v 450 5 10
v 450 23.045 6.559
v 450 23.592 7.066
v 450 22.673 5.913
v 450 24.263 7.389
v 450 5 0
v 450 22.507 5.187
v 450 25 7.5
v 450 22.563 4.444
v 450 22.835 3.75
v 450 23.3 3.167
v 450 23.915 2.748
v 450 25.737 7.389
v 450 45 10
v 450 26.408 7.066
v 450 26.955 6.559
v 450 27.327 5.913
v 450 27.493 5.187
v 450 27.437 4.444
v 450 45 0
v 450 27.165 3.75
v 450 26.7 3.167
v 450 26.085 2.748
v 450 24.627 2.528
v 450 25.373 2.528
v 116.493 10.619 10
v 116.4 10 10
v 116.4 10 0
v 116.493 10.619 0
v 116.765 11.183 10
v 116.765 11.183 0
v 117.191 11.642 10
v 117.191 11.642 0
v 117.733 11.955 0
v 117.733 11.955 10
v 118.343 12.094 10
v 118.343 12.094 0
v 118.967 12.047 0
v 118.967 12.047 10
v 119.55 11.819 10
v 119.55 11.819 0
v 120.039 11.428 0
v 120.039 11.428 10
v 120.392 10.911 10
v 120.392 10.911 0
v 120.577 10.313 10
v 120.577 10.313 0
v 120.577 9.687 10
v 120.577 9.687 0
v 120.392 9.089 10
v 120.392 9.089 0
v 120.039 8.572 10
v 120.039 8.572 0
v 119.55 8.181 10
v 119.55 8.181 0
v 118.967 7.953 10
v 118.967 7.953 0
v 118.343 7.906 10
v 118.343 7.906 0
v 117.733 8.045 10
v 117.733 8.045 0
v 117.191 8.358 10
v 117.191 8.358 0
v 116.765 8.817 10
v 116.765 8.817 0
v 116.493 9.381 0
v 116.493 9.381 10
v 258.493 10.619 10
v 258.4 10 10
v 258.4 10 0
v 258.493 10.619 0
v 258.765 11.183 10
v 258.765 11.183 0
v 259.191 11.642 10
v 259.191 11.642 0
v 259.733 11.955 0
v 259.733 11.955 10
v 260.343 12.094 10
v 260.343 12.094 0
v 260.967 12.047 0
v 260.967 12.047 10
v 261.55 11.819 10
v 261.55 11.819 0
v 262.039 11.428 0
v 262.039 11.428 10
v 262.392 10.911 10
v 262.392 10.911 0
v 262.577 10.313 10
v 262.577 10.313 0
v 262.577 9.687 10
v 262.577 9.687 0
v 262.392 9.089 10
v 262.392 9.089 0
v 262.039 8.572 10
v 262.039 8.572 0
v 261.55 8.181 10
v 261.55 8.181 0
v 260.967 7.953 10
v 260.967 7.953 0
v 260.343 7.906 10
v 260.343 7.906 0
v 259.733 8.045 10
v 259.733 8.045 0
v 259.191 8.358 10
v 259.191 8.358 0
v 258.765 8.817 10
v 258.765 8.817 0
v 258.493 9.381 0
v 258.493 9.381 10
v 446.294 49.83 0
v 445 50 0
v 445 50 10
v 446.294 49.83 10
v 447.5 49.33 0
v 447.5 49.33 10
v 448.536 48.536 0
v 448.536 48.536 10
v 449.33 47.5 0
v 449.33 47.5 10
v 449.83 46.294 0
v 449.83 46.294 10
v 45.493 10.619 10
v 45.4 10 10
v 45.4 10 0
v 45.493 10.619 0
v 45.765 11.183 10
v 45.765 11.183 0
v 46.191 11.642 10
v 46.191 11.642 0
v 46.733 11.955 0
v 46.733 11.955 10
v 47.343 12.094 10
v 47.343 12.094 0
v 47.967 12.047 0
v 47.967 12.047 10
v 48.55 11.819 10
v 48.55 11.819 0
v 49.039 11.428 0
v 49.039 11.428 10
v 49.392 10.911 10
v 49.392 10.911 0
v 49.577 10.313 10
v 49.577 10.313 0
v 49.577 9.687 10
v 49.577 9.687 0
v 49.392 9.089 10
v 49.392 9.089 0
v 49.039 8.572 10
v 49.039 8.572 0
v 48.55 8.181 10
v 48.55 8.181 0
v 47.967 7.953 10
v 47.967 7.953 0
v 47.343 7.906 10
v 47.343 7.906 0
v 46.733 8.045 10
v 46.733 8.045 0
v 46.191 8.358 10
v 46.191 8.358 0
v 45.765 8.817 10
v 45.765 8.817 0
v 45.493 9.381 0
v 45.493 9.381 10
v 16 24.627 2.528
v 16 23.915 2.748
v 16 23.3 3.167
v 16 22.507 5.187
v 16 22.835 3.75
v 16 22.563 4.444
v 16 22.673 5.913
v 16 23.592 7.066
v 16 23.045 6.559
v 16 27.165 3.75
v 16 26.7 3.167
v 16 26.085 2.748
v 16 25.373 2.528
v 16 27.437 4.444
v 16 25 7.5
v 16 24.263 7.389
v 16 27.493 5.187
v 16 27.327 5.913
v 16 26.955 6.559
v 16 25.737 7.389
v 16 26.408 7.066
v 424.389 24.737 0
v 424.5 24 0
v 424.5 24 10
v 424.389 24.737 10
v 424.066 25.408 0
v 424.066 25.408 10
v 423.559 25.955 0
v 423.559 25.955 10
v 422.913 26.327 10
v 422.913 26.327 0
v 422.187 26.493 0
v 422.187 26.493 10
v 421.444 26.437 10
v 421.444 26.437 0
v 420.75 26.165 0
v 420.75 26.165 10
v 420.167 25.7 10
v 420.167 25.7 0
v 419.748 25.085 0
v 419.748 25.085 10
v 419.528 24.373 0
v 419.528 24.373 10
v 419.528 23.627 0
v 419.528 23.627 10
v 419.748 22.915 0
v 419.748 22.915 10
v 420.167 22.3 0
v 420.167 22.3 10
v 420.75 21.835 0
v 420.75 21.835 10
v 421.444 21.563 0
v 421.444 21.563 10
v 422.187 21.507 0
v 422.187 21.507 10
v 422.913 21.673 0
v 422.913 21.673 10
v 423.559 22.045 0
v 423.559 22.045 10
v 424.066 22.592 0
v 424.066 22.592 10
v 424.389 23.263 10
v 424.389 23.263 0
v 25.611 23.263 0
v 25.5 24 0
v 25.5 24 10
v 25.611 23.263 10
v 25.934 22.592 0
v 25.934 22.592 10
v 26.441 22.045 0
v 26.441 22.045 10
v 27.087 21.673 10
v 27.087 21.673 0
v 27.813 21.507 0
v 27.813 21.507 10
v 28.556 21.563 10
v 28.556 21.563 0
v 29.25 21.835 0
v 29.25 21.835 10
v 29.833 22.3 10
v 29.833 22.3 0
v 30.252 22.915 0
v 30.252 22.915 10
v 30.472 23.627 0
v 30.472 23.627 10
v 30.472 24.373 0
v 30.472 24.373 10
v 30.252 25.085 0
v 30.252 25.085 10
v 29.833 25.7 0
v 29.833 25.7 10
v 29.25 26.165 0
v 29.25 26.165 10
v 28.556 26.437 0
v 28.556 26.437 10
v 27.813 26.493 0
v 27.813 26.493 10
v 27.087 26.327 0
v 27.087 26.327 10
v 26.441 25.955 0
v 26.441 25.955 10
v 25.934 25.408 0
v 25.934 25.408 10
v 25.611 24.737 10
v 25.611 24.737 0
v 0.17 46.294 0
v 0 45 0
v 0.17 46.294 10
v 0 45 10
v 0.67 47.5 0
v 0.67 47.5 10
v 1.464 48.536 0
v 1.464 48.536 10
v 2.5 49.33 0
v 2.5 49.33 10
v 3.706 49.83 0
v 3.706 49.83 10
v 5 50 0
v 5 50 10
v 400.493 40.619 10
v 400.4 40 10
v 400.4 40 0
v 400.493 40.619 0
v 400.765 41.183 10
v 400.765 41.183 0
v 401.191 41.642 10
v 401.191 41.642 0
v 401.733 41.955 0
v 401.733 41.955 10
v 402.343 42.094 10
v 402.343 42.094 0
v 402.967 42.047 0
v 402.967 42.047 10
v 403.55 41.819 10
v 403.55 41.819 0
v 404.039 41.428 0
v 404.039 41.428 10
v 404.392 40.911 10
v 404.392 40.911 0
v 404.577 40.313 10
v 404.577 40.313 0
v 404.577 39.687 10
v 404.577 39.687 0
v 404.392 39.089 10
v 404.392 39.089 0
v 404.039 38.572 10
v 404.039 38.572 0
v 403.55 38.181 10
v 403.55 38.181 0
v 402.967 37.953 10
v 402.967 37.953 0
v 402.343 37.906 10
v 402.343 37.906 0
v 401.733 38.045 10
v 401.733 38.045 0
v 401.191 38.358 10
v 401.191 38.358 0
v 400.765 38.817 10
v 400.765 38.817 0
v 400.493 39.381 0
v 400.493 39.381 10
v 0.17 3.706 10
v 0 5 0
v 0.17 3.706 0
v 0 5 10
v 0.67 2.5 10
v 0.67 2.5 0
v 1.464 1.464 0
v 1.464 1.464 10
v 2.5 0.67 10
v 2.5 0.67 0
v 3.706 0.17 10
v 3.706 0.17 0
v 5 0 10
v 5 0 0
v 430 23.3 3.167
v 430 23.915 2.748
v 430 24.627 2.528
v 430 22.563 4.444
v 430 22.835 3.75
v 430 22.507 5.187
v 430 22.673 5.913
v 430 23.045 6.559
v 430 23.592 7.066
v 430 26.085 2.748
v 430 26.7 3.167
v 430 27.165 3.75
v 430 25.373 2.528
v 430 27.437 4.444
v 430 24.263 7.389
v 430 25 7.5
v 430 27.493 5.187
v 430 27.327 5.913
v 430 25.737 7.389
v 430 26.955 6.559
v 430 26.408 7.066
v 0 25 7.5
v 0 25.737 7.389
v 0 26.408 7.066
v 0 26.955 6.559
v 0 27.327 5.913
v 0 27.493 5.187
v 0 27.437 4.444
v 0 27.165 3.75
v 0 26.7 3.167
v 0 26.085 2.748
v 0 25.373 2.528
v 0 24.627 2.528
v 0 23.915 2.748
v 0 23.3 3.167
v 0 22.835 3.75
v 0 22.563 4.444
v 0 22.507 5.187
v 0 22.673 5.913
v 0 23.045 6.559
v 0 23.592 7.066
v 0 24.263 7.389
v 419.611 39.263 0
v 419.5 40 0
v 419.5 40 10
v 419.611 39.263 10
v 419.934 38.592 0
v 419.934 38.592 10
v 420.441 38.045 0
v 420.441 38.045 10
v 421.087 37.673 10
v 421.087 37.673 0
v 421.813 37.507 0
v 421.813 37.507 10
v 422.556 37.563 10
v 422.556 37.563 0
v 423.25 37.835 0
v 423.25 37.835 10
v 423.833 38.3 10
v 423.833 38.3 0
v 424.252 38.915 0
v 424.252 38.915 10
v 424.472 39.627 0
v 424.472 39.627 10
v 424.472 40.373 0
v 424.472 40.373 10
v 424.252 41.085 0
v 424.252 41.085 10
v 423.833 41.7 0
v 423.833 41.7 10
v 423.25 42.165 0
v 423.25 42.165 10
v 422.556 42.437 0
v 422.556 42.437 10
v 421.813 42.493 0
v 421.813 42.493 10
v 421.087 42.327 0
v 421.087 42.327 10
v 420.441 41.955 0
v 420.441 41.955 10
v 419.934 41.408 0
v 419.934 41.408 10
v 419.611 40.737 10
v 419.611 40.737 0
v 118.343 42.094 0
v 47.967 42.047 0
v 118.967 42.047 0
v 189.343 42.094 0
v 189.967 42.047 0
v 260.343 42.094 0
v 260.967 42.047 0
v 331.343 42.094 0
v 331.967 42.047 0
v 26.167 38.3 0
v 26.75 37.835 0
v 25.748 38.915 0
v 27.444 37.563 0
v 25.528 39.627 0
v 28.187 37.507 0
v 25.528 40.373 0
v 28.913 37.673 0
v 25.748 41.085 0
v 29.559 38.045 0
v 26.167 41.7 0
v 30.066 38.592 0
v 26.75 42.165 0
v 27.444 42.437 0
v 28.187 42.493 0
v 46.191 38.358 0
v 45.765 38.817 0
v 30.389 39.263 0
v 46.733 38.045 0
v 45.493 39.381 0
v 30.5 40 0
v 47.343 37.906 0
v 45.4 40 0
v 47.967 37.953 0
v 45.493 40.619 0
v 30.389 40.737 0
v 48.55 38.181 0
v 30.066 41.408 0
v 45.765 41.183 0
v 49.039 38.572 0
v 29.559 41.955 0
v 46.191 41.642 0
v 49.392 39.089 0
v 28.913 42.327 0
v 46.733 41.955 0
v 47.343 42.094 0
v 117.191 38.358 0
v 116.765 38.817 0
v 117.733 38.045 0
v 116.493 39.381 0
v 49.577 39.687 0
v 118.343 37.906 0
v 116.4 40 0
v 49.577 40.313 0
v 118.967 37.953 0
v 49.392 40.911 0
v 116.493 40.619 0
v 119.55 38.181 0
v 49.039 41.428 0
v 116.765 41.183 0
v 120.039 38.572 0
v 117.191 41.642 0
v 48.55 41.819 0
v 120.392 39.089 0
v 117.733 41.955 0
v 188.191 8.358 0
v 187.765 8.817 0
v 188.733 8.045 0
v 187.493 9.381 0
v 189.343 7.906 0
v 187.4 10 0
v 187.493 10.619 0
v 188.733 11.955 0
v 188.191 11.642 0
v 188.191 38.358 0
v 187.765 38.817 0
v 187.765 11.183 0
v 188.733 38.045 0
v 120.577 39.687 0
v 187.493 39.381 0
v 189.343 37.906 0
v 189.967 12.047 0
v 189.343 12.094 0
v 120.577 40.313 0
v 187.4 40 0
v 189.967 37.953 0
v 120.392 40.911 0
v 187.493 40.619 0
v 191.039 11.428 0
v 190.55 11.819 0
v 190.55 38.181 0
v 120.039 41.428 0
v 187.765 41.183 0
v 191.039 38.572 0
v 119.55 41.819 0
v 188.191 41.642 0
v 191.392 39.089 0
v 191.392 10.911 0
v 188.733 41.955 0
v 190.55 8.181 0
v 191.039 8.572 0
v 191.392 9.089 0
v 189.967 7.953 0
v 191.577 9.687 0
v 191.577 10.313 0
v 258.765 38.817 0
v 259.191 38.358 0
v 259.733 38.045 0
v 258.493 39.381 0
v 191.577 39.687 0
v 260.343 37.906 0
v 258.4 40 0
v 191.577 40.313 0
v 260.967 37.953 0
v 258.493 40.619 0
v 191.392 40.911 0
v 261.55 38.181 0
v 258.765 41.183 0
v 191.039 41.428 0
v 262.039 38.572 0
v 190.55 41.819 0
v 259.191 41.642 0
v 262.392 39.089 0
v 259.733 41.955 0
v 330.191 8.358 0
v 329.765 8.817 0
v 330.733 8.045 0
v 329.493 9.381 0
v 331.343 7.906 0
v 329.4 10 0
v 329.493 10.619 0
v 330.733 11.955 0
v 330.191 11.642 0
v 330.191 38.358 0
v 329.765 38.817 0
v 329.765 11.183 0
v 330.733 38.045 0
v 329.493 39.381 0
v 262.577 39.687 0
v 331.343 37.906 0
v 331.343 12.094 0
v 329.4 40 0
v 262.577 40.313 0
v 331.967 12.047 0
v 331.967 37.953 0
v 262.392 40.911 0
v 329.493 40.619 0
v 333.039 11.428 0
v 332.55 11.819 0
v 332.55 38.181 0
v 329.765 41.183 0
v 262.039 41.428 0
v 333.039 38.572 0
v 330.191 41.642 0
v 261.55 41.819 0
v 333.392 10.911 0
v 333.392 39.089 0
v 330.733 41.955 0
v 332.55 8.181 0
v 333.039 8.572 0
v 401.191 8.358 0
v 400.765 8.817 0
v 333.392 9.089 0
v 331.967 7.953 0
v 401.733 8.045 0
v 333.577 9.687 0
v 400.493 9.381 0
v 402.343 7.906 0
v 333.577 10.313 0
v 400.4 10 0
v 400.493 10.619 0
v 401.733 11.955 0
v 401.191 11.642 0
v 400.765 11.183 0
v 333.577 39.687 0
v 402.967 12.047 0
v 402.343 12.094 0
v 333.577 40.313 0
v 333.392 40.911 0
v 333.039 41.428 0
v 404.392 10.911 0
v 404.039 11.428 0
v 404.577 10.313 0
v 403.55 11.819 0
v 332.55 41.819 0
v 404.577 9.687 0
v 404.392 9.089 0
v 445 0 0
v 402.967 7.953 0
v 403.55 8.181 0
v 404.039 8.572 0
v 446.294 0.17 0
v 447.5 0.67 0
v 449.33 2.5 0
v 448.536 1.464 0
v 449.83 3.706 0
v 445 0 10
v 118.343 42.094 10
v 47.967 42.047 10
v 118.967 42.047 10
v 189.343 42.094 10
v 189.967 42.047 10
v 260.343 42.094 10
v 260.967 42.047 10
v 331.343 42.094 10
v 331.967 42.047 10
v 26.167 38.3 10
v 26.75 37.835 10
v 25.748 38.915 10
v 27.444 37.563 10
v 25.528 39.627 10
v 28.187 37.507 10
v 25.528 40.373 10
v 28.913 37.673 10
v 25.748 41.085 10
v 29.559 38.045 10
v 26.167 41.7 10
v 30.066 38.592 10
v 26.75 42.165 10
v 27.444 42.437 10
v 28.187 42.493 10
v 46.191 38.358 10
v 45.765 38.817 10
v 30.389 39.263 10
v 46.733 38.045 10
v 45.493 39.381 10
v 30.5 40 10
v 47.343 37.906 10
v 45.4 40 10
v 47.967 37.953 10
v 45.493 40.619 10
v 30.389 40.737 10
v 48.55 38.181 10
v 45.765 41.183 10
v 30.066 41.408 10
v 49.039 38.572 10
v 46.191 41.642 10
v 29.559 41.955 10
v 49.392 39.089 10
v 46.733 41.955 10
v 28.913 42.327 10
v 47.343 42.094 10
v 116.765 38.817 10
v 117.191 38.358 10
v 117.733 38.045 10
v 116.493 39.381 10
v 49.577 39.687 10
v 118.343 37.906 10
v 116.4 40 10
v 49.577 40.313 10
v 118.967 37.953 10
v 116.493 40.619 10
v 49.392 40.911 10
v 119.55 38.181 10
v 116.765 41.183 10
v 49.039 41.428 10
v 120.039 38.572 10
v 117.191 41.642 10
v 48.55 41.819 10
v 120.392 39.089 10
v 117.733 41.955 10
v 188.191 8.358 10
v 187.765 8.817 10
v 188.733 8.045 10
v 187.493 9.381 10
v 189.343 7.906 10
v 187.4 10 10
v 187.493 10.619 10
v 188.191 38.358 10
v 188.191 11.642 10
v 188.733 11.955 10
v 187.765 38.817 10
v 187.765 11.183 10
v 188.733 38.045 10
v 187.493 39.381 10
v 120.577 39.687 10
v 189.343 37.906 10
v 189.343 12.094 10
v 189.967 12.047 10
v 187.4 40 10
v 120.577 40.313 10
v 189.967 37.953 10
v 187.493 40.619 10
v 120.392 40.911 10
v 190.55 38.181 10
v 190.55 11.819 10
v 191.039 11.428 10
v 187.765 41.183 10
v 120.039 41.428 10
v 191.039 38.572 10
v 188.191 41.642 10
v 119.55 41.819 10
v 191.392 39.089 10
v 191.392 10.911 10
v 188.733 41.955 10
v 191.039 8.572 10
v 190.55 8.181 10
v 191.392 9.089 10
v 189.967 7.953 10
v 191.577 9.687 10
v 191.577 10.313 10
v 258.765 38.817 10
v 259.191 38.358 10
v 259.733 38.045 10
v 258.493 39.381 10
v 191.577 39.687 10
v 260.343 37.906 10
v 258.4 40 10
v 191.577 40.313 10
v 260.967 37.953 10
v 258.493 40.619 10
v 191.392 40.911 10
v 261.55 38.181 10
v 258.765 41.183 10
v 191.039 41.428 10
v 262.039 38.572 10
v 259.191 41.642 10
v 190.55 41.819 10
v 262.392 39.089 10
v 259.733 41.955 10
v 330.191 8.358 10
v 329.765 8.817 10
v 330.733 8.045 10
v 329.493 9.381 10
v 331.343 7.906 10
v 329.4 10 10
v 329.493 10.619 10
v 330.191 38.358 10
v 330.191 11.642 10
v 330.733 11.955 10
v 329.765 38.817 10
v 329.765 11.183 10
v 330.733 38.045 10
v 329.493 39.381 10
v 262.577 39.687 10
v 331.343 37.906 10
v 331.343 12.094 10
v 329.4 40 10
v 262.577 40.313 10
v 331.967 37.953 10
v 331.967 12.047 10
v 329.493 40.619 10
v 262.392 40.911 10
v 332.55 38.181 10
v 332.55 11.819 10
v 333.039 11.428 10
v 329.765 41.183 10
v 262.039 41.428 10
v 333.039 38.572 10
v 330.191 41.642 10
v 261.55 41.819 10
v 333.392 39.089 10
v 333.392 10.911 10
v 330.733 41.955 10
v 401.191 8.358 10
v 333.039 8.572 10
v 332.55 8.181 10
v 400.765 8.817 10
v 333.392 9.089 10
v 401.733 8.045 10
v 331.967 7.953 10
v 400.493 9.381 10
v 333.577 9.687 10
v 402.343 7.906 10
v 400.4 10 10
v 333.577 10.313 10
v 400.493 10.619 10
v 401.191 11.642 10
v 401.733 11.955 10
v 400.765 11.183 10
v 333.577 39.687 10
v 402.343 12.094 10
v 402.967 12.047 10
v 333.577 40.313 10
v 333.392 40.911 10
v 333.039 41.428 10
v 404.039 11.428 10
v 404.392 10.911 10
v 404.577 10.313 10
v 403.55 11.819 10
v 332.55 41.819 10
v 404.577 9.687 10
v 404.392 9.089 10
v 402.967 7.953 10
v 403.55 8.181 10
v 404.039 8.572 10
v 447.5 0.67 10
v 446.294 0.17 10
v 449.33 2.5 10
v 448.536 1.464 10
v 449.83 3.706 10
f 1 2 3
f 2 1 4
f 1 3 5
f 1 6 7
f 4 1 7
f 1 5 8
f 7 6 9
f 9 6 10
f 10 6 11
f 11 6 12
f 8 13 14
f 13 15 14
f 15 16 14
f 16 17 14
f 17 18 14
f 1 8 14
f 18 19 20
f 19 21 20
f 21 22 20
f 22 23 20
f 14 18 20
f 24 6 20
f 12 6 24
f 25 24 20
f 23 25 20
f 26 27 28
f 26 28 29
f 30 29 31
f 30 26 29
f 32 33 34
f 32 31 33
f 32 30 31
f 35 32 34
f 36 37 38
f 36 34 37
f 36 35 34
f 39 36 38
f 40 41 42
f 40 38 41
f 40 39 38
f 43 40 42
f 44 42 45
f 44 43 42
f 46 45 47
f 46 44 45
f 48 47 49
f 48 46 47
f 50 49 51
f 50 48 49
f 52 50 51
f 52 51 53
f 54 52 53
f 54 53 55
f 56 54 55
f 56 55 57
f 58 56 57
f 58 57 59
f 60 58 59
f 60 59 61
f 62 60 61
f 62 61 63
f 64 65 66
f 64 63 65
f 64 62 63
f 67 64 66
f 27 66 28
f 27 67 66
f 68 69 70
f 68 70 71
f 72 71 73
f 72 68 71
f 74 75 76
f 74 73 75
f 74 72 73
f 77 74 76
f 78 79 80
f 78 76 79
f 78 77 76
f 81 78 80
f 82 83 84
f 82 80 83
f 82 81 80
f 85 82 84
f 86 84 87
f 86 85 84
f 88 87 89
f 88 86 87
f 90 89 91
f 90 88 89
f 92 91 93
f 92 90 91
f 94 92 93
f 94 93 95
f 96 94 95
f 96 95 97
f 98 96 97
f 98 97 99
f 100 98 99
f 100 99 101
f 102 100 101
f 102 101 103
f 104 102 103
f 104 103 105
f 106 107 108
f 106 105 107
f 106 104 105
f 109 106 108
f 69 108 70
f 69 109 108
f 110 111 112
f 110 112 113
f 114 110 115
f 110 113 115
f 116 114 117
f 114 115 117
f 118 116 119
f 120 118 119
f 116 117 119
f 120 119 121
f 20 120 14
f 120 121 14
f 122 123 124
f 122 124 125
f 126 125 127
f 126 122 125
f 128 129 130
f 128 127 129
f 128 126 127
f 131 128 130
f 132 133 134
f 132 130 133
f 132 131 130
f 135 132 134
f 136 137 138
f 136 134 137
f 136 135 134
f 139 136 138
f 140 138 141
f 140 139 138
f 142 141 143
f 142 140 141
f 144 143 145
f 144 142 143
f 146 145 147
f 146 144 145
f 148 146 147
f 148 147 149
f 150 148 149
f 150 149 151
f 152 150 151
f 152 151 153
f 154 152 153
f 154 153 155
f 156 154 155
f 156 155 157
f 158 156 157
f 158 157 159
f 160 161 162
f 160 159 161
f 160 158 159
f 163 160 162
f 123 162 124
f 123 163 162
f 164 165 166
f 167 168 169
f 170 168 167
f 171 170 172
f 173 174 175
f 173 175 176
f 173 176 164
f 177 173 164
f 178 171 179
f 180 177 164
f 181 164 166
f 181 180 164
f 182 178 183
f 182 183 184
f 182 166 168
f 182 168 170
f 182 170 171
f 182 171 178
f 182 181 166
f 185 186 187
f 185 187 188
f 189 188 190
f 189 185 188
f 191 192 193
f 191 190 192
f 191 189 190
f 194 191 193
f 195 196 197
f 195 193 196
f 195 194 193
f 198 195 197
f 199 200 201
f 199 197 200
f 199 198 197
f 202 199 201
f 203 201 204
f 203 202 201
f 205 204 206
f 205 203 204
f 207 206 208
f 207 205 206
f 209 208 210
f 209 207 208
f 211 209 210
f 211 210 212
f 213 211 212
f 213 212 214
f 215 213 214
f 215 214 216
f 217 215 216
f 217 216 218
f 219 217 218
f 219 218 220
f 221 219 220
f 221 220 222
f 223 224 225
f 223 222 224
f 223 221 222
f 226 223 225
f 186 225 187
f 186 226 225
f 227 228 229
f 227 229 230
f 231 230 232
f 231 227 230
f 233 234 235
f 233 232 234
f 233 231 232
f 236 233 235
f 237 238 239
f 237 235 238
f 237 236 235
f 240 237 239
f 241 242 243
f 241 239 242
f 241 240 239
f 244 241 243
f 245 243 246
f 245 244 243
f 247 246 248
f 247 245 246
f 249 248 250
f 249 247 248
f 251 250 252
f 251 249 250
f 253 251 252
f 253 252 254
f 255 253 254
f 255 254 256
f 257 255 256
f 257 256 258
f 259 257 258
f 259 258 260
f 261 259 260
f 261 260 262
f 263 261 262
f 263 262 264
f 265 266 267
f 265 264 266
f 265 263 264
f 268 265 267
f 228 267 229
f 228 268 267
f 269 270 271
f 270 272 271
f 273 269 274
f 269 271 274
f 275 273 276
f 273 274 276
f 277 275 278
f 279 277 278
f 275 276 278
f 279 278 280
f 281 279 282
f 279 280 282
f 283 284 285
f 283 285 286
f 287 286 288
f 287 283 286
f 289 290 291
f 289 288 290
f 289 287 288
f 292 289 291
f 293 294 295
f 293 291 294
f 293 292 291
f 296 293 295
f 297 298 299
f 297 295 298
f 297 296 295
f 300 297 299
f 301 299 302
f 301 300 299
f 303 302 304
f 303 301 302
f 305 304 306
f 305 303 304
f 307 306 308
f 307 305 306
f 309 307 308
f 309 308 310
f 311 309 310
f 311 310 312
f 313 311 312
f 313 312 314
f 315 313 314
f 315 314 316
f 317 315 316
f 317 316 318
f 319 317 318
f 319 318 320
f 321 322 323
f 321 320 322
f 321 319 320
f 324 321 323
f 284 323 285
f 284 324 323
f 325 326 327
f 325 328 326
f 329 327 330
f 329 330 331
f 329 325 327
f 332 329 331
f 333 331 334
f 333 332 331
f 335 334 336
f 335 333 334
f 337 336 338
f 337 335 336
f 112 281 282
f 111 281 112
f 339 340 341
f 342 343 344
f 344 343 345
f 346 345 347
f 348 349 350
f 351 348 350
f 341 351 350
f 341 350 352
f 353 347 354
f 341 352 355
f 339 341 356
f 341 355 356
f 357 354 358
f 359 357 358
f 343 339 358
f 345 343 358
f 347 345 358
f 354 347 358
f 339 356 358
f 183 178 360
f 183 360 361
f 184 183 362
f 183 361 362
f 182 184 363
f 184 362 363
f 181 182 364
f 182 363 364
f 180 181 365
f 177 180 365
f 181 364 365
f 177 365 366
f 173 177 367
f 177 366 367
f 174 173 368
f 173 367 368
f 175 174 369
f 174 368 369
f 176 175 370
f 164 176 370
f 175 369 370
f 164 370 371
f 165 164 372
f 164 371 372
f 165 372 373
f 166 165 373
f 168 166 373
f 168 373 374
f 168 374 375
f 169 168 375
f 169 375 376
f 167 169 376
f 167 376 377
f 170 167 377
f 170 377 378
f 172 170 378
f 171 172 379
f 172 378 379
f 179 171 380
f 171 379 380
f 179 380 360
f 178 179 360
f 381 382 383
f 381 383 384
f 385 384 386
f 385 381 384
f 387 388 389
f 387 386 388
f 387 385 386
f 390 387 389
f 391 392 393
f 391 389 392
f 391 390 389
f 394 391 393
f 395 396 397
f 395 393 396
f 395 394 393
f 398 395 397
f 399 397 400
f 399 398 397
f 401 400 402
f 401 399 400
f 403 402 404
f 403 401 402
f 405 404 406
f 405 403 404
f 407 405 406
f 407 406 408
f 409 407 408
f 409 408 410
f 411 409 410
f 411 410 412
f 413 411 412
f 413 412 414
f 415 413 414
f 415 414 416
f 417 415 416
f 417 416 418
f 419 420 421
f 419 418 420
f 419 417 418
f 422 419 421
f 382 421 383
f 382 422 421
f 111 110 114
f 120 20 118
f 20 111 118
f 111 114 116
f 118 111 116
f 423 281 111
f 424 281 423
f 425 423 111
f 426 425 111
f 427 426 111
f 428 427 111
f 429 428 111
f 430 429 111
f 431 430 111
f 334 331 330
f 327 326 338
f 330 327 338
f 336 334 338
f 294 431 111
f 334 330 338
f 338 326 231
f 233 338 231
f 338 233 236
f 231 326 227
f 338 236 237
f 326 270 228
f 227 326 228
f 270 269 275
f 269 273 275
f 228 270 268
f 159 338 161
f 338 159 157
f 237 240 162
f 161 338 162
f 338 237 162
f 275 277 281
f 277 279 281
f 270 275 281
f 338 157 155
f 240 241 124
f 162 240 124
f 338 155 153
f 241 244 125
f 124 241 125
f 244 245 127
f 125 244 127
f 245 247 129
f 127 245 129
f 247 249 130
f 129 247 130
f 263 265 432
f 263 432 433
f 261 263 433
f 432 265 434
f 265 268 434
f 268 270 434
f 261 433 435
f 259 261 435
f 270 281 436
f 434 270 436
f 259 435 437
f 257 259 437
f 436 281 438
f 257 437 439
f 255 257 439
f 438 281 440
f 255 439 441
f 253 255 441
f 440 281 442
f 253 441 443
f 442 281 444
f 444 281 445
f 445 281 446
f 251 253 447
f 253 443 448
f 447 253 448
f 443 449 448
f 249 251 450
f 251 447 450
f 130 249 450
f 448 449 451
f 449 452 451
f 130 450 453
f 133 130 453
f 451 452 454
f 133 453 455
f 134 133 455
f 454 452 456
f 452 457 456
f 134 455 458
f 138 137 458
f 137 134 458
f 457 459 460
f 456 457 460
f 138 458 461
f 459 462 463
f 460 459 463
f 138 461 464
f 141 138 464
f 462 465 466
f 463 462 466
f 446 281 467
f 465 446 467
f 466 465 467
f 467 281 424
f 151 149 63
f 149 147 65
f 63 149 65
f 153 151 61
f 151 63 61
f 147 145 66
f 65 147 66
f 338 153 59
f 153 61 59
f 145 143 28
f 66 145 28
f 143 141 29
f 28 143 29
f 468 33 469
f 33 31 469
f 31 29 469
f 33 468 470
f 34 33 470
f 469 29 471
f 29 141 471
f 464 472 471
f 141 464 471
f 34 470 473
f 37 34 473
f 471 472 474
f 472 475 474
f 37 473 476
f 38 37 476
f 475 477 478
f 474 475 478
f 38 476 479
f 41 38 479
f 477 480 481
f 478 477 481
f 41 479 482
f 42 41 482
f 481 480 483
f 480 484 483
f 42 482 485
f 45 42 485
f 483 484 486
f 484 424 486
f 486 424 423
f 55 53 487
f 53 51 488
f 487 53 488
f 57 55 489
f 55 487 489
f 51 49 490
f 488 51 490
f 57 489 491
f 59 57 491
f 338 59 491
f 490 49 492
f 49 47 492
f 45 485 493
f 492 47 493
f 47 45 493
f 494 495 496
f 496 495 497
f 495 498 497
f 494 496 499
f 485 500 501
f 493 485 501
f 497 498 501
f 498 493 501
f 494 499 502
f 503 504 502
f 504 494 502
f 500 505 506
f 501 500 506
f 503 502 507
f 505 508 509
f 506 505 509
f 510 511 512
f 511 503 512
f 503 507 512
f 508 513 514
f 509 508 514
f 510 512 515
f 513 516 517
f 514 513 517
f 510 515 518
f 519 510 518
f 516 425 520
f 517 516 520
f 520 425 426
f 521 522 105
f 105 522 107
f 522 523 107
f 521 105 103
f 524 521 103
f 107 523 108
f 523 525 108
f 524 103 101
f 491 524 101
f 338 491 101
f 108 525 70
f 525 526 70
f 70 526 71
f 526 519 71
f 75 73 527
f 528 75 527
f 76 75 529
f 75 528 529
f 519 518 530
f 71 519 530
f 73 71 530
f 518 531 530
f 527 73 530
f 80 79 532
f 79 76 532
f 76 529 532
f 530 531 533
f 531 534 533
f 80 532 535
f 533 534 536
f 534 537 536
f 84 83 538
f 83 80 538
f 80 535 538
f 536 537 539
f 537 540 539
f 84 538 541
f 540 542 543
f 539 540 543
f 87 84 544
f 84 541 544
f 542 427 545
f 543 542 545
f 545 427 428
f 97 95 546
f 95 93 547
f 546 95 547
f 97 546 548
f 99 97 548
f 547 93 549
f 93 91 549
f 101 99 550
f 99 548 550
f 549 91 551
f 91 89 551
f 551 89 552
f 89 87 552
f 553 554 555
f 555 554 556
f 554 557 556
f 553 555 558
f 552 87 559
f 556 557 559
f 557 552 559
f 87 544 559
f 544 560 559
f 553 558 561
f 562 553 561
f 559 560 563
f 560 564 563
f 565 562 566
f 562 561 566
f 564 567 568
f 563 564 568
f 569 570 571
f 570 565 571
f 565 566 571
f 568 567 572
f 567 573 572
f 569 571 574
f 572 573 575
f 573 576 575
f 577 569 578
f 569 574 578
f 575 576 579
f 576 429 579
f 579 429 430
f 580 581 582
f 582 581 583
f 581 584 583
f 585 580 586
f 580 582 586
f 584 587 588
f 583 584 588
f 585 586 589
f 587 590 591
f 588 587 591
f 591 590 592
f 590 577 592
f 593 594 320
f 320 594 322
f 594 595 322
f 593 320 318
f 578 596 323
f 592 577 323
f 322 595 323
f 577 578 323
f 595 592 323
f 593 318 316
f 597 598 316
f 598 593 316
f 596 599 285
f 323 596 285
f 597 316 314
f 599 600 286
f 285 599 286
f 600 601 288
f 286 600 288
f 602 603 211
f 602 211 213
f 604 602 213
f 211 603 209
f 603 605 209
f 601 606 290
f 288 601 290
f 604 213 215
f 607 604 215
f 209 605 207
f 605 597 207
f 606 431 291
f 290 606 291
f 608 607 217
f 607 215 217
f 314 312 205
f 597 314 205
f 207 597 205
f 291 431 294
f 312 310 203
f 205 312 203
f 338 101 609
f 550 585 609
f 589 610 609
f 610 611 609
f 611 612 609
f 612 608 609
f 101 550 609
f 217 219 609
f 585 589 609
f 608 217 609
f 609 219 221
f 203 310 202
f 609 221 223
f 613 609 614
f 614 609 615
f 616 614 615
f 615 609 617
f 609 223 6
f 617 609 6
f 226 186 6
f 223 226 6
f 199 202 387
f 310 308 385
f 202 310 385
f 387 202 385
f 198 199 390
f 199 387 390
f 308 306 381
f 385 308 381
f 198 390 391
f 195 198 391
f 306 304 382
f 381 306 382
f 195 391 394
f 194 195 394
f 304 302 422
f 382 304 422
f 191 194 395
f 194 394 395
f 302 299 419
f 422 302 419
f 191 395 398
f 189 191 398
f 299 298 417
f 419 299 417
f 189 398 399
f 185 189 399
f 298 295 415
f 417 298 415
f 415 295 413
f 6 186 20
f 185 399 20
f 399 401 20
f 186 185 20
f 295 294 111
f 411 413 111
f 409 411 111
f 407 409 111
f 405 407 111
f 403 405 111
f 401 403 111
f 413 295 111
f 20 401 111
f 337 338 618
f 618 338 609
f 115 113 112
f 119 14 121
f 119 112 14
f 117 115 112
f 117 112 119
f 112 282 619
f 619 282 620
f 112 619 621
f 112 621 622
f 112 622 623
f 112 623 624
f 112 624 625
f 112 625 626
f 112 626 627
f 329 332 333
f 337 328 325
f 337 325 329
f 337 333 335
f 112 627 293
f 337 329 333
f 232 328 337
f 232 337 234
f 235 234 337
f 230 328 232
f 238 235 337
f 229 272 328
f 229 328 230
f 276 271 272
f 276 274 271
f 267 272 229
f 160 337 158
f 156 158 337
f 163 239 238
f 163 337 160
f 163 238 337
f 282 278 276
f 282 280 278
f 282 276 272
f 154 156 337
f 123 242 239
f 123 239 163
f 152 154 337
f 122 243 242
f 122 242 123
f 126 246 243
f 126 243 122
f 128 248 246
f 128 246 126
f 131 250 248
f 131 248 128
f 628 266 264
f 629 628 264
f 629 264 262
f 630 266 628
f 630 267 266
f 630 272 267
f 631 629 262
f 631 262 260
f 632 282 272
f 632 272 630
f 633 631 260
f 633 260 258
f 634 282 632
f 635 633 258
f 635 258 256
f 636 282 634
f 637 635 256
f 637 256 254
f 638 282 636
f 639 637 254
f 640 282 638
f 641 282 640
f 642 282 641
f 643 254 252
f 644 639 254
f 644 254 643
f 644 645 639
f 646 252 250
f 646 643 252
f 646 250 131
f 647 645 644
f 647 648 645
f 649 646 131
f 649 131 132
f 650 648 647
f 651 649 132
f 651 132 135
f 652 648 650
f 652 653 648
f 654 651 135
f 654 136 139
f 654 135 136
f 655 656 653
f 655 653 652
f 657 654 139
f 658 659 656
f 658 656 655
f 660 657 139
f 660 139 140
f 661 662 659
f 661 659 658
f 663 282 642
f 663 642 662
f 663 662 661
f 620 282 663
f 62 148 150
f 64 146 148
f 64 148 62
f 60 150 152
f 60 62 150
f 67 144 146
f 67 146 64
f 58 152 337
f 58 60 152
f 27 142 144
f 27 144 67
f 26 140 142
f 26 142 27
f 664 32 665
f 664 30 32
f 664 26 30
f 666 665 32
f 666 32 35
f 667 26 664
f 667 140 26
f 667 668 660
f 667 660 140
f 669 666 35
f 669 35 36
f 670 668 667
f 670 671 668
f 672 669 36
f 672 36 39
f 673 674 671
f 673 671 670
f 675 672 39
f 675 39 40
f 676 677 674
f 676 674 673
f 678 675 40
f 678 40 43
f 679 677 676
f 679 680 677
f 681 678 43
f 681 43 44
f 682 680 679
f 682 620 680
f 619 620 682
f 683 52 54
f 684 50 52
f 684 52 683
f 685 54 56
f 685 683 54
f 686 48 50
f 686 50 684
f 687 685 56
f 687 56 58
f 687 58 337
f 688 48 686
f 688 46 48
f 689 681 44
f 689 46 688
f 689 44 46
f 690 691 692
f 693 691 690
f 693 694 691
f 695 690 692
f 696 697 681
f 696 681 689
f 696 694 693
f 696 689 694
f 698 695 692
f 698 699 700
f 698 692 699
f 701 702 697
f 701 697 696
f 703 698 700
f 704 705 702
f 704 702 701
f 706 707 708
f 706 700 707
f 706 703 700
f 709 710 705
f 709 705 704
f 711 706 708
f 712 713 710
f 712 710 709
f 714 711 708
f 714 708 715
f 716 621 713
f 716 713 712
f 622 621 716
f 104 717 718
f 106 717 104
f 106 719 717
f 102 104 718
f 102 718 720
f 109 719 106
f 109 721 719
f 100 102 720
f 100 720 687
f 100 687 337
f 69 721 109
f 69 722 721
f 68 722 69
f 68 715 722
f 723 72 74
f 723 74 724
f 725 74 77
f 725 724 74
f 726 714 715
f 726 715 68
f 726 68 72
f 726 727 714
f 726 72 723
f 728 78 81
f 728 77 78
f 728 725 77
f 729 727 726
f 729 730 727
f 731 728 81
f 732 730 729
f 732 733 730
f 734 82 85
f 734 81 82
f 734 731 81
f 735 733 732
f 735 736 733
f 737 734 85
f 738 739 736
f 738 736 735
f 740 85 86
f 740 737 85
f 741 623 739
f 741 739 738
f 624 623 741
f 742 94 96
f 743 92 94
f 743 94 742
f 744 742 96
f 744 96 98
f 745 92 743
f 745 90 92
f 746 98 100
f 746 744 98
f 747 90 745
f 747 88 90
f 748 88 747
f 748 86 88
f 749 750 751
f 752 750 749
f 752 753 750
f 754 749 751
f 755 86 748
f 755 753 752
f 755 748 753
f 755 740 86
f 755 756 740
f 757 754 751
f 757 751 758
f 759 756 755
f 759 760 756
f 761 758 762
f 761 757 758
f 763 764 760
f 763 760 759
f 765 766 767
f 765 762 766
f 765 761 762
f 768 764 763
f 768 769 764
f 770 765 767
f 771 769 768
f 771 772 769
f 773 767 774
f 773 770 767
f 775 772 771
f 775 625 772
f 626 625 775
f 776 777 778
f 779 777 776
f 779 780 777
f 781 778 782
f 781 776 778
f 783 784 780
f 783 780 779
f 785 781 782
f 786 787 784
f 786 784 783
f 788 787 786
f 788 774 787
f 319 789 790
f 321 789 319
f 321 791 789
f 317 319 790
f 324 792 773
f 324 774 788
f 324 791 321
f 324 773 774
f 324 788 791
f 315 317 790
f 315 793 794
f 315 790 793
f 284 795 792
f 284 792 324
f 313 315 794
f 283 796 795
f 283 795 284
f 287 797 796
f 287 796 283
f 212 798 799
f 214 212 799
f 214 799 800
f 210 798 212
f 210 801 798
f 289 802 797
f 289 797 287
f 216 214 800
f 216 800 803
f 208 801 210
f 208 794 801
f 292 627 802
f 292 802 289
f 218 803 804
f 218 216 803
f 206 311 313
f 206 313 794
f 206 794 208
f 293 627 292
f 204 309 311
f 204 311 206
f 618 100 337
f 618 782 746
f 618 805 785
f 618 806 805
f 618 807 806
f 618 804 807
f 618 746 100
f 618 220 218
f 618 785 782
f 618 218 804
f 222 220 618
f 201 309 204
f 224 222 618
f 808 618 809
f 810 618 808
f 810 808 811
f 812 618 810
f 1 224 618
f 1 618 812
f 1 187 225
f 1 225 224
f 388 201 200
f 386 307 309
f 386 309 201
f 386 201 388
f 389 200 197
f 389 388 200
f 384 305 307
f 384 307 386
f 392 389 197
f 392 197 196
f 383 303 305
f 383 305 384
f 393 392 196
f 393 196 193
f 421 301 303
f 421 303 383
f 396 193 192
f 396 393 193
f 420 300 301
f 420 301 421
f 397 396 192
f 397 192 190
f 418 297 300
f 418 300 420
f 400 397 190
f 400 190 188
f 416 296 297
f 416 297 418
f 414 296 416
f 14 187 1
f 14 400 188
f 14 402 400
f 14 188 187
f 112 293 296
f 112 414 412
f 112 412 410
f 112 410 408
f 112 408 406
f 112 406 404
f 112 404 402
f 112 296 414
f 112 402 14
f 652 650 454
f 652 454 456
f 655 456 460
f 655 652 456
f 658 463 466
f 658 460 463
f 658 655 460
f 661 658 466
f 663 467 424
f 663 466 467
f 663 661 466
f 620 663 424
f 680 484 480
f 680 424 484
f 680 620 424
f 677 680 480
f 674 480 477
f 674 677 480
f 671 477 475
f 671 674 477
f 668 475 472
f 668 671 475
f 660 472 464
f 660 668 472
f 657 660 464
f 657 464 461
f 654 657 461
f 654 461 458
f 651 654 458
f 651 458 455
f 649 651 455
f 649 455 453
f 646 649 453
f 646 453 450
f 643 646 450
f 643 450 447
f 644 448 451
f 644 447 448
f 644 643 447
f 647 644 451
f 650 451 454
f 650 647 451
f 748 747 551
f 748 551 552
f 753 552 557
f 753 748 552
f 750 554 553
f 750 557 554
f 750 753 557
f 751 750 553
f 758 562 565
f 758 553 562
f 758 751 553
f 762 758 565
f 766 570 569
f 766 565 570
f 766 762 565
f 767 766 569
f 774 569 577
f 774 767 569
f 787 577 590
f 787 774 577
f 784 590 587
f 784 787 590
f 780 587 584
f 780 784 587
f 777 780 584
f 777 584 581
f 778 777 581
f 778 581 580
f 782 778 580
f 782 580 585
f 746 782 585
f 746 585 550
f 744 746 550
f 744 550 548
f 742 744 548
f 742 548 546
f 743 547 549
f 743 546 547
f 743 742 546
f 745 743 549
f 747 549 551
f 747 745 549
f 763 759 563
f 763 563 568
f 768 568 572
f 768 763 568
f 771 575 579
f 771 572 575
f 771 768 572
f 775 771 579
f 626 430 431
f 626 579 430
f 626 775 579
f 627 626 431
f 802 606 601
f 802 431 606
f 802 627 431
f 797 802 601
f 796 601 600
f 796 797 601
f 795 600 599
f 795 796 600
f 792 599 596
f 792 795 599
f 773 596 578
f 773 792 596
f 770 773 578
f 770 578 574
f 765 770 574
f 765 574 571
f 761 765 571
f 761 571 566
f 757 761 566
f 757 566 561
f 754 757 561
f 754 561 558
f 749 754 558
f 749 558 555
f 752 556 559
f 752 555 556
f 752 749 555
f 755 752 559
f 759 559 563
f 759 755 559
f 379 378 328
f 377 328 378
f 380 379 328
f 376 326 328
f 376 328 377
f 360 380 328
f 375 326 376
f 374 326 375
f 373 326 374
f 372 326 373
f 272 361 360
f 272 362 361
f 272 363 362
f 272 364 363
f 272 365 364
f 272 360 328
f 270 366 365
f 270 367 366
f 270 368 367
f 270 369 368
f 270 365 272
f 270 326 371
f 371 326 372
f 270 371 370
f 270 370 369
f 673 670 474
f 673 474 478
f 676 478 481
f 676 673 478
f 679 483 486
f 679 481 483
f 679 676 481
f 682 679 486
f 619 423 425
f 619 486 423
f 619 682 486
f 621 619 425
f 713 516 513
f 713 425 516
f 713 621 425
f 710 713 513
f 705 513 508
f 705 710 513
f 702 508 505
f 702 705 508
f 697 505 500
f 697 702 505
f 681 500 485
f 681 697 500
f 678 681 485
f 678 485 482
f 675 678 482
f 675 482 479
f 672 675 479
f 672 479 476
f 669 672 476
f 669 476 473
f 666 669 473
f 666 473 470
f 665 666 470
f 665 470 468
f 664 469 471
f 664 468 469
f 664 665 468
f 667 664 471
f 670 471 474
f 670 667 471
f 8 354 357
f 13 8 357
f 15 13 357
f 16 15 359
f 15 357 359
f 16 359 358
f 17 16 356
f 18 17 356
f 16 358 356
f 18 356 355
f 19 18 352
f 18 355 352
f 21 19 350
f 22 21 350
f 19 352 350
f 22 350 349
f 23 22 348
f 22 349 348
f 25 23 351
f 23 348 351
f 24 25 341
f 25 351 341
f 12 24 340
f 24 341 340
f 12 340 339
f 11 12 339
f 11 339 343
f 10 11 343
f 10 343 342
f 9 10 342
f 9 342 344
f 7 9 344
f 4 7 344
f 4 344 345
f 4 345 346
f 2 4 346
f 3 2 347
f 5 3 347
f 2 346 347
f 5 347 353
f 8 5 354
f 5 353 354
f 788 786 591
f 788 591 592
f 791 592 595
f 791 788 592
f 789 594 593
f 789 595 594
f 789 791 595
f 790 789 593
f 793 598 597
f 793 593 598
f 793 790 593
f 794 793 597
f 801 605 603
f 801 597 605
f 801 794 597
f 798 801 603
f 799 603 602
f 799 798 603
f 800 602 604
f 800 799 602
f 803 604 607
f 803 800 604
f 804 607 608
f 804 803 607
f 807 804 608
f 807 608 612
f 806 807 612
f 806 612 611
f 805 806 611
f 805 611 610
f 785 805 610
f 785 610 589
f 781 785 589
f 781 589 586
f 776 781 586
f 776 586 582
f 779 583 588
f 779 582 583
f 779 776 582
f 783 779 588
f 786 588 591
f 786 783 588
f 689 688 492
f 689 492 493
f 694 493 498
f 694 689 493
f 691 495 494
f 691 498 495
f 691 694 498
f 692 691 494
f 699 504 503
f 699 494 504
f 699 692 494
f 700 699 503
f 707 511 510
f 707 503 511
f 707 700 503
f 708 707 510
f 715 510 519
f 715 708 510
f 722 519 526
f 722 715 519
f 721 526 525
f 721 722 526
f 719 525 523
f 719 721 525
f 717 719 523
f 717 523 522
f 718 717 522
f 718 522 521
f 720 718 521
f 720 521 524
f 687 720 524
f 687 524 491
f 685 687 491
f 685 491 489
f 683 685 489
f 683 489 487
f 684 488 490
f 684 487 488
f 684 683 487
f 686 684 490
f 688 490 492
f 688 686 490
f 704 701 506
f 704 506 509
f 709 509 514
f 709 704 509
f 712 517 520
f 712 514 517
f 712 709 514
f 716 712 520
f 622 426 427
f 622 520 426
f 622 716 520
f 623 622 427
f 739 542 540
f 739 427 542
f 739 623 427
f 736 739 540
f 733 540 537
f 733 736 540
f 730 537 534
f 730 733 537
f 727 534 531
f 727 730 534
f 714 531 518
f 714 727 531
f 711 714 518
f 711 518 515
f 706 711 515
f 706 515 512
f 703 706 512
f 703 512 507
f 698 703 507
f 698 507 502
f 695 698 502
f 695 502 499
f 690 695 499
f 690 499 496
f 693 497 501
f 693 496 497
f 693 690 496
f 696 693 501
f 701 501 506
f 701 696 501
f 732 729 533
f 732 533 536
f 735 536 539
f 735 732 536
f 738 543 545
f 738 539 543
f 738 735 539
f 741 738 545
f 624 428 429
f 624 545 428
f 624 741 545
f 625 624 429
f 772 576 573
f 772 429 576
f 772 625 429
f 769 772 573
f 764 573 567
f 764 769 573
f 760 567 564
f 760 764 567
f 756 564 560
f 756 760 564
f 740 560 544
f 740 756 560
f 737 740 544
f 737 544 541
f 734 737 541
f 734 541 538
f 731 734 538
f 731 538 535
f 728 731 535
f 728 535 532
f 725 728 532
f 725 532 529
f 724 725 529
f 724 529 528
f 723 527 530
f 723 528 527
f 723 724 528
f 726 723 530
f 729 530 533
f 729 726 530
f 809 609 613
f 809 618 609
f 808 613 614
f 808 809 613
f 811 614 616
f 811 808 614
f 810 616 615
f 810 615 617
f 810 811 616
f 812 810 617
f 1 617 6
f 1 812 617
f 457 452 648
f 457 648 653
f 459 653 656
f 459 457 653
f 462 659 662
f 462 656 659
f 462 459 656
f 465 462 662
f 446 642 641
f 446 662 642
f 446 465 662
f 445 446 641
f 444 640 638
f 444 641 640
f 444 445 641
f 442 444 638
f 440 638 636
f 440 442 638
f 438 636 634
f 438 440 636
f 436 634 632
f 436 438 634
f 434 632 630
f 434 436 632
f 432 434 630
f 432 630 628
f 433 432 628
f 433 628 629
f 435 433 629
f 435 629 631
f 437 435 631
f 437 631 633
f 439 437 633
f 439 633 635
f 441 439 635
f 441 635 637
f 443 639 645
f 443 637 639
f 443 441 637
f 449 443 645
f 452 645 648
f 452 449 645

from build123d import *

# Parameters (mm, degrees)
ESQUISSE1_W                  = 450
ESQUISSE1_H                  = 50
BOSS_EXTRU_1_DEPTH           = 10
ESQUISSE2_R                  = 2.5
ENL_V_MAT_EXTRU_1_DEPTH      = 16
ENL_V_START                  = -430
ESQUISSE2_2_R                = 2.5
ENL_V_MAT_EXTRU_2_DEPTH      = 20
CONG_1_R                     = 5
ENL_V_MAT_EXTRU_3_DEPTH      = 453.879674969
ENL_V_MAT_EXTRU_3_DEPTH_BACK = 453.879674969
ESQUISSE3_R                  = 2.1
ENL_V_MAT_EXTRU_4_DEPTH      = 453.879674969
ENL_V_MAT_EXTRU_4_DEPTH_BACK = 453.879674969
ESQUISSE4_R                  = 2.5


with BuildPart() as part:
    # Esquisse1 → Boss.-Extru.1 (new body)
    with BuildSketch(Plane.XY):
        with Locations((225, 25)):
            Rectangle(ESQUISSE1_W, ESQUISSE1_H)
    extrude(amount=BOSS_EXTRU_1_DEPTH)

    # Esquisse2 → Enlèv. mat.-Extru.1 (cut)
    with BuildSketch(Plane.ZY):
        with Locations((5, 25)):
            Circle(ESQUISSE2_R)
    extrude(amount=-ENL_V_MAT_EXTRU_1_DEPTH, mode=Mode.SUBTRACT)

    # Esquisse2<2> → Enlèv. mat.-Extru.2 (cut)
    with BuildSketch(Plane.ZY.offset(ENL_V_START)):
        with Locations((5, 25)):
            Circle(ESQUISSE2_2_R)
    extrude(amount=-ENL_V_MAT_EXTRU_2_DEPTH, mode=Mode.SUBTRACT)

    # Congé1
    cong_1_edges = [part.edges().sort_by_distance(p)[0] for p in [
        (0, 50, 5),
        (450, 50, 5),
        (450, 0, 5),
        (0, 0, 5),
    ]]
    fillet(cong_1_edges, radius=CONG_1_R)

    # Esquisse3 → Enlèv. mat.-Extru.3 (cut, two sides: drawn at the far end of the back side and taken through both)
    with BuildSketch(Plane(origin=(0, 0, 0), x_dir=(-1, 0, 0), z_dir=(0, 0, -1)).offset(-ENL_V_MAT_EXTRU_3_DEPTH_BACK)):
        with Locations((-260.5, 40)):
            Circle(ESQUISSE3_R)
        with Locations((-260.5, 10)):
            Circle(ESQUISSE3_R)
        with Locations((-331.5, 10)):
            Circle(ESQUISSE3_R)
        with Locations((-331.5, 40)):
            Circle(ESQUISSE3_R)
        with Locations((-402.5, 40)):
            Circle(ESQUISSE3_R)
        with Locations((-402.5, 10)):
            Circle(ESQUISSE3_R)
        with Locations((-47.5, 10)):
            Circle(ESQUISSE3_R)
        with Locations((-47.5, 40)):
            Circle(ESQUISSE3_R)
        with Locations((-118.5, 40)):
            Circle(ESQUISSE3_R)
        with Locations((-118.5, 10)):
            Circle(ESQUISSE3_R)
        with Locations((-189.5, 10)):
            Circle(ESQUISSE3_R)
        with Locations((-189.5, 40)):
            Circle(ESQUISSE3_R)
    extrude(amount=ENL_V_MAT_EXTRU_3_DEPTH + ENL_V_MAT_EXTRU_3_DEPTH_BACK, mode=Mode.SUBTRACT)

    # Esquisse4 → Enlèv. mat.-Extru.4 (cut, two sides: drawn at the far end of the back side and taken through both)
    with BuildSketch(Plane.XY.offset(10).offset(-ENL_V_MAT_EXTRU_4_DEPTH_BACK)):
        with Locations((28, 40)):
            Circle(ESQUISSE4_R)
        with Locations(Location((28, 24, 0), (0, 0, 180))):
            Circle(ESQUISSE4_R)
        with Locations((422, 24)):
            Circle(ESQUISSE4_R)
        with Locations(Location((422, 40, 0), (0, 0, 180))):
            Circle(ESQUISSE4_R)
    extrude(amount=ENL_V_MAT_EXTRU_4_DEPTH + ENL_V_MAT_EXTRU_4_DEPTH_BACK, mode=Mode.SUBTRACT)


solid = part.part
